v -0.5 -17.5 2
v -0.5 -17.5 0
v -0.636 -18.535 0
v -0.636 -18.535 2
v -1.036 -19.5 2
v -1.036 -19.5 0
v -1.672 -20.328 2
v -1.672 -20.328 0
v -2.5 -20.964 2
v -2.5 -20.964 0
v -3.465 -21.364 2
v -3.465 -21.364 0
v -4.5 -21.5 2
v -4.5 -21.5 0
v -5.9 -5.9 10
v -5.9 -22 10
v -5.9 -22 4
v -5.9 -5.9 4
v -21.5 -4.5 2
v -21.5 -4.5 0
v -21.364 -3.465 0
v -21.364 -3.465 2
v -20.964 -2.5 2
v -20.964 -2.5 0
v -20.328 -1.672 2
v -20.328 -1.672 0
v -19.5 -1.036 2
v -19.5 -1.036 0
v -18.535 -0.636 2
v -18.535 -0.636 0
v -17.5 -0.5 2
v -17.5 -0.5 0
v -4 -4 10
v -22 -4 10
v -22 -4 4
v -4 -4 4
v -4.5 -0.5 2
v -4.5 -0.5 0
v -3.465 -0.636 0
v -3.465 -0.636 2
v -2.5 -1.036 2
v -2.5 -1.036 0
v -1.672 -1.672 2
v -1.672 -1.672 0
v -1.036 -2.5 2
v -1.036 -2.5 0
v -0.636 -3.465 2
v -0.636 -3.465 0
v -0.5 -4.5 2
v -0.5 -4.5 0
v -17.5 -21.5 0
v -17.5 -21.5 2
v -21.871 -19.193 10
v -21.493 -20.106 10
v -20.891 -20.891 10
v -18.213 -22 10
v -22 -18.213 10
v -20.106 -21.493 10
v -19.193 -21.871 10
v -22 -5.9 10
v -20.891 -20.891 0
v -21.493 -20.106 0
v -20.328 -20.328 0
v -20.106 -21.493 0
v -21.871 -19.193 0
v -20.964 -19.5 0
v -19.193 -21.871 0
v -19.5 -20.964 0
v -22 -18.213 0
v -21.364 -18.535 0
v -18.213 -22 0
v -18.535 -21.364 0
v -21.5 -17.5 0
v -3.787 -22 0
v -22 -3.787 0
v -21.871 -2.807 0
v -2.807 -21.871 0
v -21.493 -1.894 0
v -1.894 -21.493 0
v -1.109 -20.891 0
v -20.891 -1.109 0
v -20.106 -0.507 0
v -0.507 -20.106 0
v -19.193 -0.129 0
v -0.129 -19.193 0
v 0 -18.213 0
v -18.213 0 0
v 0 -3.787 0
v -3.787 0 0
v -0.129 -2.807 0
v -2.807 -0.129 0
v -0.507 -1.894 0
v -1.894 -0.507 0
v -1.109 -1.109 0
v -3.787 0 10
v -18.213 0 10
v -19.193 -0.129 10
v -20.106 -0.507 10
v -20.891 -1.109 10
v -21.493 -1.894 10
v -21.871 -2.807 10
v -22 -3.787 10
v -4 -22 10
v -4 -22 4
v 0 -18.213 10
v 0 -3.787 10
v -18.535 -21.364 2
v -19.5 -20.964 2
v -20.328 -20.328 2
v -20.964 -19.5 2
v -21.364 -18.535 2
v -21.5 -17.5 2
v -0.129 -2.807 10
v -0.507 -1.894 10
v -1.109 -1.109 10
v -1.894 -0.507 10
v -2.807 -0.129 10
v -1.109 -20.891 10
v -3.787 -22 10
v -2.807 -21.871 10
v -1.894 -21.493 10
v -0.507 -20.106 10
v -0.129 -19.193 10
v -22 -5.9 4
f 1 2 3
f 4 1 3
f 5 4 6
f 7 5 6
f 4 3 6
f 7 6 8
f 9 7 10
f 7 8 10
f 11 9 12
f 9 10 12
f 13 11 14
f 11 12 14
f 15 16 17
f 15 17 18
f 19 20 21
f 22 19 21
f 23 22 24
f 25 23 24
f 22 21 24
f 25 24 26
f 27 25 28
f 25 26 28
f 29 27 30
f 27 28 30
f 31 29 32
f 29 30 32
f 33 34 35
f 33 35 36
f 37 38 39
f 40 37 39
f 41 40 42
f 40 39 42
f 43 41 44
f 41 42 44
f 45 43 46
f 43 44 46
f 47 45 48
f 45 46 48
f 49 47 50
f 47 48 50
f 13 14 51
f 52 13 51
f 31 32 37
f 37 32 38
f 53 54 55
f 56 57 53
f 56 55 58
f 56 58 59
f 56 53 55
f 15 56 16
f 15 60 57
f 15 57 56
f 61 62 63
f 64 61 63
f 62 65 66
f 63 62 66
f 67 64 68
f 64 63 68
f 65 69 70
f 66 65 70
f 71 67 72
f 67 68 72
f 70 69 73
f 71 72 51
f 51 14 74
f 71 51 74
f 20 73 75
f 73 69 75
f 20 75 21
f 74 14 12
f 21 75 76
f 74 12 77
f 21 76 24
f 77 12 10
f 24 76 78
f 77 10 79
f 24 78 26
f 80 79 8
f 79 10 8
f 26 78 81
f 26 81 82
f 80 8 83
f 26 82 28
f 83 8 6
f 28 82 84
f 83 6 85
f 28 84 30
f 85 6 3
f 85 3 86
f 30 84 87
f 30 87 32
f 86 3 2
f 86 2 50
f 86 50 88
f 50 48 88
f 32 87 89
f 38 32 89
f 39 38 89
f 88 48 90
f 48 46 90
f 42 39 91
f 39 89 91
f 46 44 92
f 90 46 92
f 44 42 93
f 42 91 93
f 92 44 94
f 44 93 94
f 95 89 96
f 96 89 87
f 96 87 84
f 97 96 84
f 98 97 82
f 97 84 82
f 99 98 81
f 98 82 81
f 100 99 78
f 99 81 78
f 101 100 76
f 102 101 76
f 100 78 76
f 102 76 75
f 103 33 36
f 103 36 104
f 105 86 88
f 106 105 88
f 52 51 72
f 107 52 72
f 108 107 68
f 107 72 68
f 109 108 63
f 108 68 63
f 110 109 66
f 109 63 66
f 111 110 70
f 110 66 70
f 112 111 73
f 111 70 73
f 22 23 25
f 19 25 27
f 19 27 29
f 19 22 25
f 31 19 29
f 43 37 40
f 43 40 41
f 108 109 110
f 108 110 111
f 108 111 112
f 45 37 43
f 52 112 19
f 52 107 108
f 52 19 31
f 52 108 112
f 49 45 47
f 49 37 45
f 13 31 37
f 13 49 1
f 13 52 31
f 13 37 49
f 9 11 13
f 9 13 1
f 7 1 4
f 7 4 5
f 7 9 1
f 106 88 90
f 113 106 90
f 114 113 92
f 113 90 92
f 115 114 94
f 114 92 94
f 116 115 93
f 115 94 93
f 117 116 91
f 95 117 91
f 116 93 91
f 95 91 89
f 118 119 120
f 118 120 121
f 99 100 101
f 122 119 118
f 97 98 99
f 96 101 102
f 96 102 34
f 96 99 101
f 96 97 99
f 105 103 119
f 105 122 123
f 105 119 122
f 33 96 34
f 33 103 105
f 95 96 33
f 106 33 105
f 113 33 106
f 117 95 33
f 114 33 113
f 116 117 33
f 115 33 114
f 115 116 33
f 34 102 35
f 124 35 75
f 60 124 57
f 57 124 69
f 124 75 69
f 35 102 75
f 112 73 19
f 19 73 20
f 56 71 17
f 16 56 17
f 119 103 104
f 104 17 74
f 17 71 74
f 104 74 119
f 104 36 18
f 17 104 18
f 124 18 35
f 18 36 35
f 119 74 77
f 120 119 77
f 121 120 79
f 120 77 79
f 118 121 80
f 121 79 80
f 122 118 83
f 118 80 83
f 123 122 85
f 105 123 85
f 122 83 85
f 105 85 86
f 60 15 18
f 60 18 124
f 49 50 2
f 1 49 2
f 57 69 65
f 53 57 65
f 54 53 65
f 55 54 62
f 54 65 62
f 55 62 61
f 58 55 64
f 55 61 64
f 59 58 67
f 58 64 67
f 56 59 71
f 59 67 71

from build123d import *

# Parameters (mm, degrees)
PAD_DEPTH       = 10
POCKET_DEPTH    = 6
POCKET001_DEPTH = 2


with BuildPart() as part:
    # Sketch → Pad (new body)
    with BuildSketch(Plane.XY):
        with BuildLine():
            Line((-18.212601, -22), (-3.787399, -22))
            ThreePointArc((-3.787399, -22), (-1.109303, -20.890697), (0, -18.212601))
            Line((0, -18.212601), (0, -3.787399))
            ThreePointArc((0, -3.787399), (-1.109303, -1.109303), (-3.787399, 0))
            Line((-3.787399, 0), (-18.212601, 0))
            ThreePointArc((-18.212601, 0), (-20.890697, -1.109303), (-22, -3.787399))
            Line((-22, -3.787399), (-22, -18.212601))
            ThreePointArc((-22, -18.212601), (-20.890697, -20.890697), (-18.212601, -22))
        make_face()
    extrude(amount=PAD_DEPTH)

    # Sketch001 (on Face10 of Pad) → Pocket (cut)
    with BuildSketch(Plane.XY.offset(10)):
        Polygon((-4, -4), (-4, -24), (-5.9, -24), (-5.9, -5.9), (-24, -5.9), (-24, -4), align=None)
    extrude(amount=-POCKET_DEPTH, mode=Mode.SUBTRACT)

    # Sketch002 (on Face2 of Pocket) → Pocket001 (cut)
    with BuildSketch(Plane(origin=(0, 0, 0), x_dir=(1, 0, 0), z_dir=(0, 0, -1))):
        with BuildLine():
            Line((-21.5, 17.5), (-21.5, 4.5))
            ThreePointArc((-21.5, 4.5), (-20.328427, 1.671573), (-17.5, 0.5))
            Line((-17.5, 0.5), (-4.5, 0.5))
            ThreePointArc((-4.5, 0.5), (-1.671573, 1.671573), (-0.5, 4.5))
            Line((-0.5, 4.5), (-0.5, 17.5))
            ThreePointArc((-0.5, 17.5), (-1.671573, 20.328427), (-4.5, 21.5))
            Line((-4.5, 21.5), (-17.5, 21.5))
            ThreePointArc((-17.5, 21.5), (-20.328427, 20.328427), (-21.5, 17.5))
        make_face()
    extrude(amount=-POCKET001_DEPTH, mode=Mode.SUBTRACT)


solid = part.part
